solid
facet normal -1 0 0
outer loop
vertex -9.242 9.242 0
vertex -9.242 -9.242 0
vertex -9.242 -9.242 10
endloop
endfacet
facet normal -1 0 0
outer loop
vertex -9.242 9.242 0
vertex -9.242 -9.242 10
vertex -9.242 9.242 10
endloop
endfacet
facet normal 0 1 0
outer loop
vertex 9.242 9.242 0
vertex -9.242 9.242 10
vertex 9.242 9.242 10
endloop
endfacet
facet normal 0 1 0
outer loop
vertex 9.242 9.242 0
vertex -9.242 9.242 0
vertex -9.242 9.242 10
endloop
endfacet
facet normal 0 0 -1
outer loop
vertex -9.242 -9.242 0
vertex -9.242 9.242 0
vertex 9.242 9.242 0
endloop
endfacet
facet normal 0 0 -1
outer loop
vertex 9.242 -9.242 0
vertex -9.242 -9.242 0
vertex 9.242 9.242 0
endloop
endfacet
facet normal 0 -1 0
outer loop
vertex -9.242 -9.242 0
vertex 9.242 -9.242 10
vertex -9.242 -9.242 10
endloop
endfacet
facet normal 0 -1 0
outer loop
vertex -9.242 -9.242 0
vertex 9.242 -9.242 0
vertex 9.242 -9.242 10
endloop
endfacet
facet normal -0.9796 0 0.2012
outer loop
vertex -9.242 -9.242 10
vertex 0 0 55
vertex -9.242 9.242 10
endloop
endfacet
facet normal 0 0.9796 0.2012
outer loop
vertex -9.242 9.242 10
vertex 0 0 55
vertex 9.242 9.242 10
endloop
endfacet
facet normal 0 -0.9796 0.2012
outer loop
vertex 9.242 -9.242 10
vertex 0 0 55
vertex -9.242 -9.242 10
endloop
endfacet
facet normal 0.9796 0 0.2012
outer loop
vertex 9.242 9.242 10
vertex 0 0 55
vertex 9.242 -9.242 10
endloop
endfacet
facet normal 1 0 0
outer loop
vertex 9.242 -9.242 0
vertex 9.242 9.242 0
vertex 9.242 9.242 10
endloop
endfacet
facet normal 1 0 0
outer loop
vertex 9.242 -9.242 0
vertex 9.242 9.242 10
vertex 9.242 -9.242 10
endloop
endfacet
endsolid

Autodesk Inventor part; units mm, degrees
ref_plane "YZ Plane" through (0, 0, 0) normal (1, 0, 0) x (0, 1, 0)
ref_plane "XZ Plane" through (0, 0, 0) normal (0, 1, 0) x (-1, 0, 0)
ref_plane "XY Plane" through (0, 0, 0) normal (0, 0, 1) x (1, 0, 0)
sketch "Absorber-Base" plane through (0, 0, 0) normal (0, 0, 1) x (1, 0, 0)
  line L0 (-9.2424, 9.2424) -> (9.2424, 9.2424)
  line L1 (9.2424, 9.2424) -> (9.2424, -9.2424)
  line L2 (9.2424, -9.2424) -> (-9.2424, -9.2424)
  line L3 (-9.2424, -9.2424) -> (-9.2424, 9.2424)
  line L4 (-9.2424, 9.2424) -> (9.2424, -9.2424) construction
  line L5 (9.2424, 9.2424) -> (-9.2424, -9.2424) construction
  point P0 (0, 0)
  dimension "d0" = 18.4849
extrude "Gesamtvolumen" add sketch "Absorber-Base" along normal blind 55
sketch "Skizze2" plane through (0, 0, 0) normal (0, 1, 0) x (-1, 0, 0)
  line L0 (-28, 0) -> (28, 0) projected
  line L1 (9.2424, 0) -> (9.2424, 55) projected
  line L2 (-9.2424, 0) -> (-9.2424, 55) projected
  line L3 (9.2424, 0) -> (-9.2424, 0)
  line L4 (-9.2424, 0) -> (-9.2424, 10)
  line L5 (-9.2424, 10) -> (9.2424, 10)
  line L6 (9.2424, 10) -> (9.2424, 0)
  line L7 (-9.2424, 55) -> (9.2424, 55) projected
  line L8 (0, 55) -> (9.2424, 10)
  line L9 (0, 55) -> (-9.2424, 10)
  point P0 (0, 0)
  point P1 (9.2424, 10)
  dimension "d6" = 10
extrude "Cutaway" cut sketch "Skizze2" along normal mid plane 18.4848 contours L2 L7 L9 | L8 L7 L1
pattern_circular "Runde Anordnung1" count 2 over 90 about axis through (0, 0, -10) along (0, 0, 1) of "Cutaway"
equation "\"d0\" = Base_Seitenlänge"
equation "\"d1\" = Gesamthöhe"
equation "\"d6\" = Base_Höhe"
equation "\"d7\" = Base_Seitenlänge"
equation "\"Base_Seitenlänge\" = 18.48485"
equation "\"Base_Höhe\" = 10"
equation "\"Gesamthöhe\" = 55"
properties part number "Absorber - SEA-PM5"
